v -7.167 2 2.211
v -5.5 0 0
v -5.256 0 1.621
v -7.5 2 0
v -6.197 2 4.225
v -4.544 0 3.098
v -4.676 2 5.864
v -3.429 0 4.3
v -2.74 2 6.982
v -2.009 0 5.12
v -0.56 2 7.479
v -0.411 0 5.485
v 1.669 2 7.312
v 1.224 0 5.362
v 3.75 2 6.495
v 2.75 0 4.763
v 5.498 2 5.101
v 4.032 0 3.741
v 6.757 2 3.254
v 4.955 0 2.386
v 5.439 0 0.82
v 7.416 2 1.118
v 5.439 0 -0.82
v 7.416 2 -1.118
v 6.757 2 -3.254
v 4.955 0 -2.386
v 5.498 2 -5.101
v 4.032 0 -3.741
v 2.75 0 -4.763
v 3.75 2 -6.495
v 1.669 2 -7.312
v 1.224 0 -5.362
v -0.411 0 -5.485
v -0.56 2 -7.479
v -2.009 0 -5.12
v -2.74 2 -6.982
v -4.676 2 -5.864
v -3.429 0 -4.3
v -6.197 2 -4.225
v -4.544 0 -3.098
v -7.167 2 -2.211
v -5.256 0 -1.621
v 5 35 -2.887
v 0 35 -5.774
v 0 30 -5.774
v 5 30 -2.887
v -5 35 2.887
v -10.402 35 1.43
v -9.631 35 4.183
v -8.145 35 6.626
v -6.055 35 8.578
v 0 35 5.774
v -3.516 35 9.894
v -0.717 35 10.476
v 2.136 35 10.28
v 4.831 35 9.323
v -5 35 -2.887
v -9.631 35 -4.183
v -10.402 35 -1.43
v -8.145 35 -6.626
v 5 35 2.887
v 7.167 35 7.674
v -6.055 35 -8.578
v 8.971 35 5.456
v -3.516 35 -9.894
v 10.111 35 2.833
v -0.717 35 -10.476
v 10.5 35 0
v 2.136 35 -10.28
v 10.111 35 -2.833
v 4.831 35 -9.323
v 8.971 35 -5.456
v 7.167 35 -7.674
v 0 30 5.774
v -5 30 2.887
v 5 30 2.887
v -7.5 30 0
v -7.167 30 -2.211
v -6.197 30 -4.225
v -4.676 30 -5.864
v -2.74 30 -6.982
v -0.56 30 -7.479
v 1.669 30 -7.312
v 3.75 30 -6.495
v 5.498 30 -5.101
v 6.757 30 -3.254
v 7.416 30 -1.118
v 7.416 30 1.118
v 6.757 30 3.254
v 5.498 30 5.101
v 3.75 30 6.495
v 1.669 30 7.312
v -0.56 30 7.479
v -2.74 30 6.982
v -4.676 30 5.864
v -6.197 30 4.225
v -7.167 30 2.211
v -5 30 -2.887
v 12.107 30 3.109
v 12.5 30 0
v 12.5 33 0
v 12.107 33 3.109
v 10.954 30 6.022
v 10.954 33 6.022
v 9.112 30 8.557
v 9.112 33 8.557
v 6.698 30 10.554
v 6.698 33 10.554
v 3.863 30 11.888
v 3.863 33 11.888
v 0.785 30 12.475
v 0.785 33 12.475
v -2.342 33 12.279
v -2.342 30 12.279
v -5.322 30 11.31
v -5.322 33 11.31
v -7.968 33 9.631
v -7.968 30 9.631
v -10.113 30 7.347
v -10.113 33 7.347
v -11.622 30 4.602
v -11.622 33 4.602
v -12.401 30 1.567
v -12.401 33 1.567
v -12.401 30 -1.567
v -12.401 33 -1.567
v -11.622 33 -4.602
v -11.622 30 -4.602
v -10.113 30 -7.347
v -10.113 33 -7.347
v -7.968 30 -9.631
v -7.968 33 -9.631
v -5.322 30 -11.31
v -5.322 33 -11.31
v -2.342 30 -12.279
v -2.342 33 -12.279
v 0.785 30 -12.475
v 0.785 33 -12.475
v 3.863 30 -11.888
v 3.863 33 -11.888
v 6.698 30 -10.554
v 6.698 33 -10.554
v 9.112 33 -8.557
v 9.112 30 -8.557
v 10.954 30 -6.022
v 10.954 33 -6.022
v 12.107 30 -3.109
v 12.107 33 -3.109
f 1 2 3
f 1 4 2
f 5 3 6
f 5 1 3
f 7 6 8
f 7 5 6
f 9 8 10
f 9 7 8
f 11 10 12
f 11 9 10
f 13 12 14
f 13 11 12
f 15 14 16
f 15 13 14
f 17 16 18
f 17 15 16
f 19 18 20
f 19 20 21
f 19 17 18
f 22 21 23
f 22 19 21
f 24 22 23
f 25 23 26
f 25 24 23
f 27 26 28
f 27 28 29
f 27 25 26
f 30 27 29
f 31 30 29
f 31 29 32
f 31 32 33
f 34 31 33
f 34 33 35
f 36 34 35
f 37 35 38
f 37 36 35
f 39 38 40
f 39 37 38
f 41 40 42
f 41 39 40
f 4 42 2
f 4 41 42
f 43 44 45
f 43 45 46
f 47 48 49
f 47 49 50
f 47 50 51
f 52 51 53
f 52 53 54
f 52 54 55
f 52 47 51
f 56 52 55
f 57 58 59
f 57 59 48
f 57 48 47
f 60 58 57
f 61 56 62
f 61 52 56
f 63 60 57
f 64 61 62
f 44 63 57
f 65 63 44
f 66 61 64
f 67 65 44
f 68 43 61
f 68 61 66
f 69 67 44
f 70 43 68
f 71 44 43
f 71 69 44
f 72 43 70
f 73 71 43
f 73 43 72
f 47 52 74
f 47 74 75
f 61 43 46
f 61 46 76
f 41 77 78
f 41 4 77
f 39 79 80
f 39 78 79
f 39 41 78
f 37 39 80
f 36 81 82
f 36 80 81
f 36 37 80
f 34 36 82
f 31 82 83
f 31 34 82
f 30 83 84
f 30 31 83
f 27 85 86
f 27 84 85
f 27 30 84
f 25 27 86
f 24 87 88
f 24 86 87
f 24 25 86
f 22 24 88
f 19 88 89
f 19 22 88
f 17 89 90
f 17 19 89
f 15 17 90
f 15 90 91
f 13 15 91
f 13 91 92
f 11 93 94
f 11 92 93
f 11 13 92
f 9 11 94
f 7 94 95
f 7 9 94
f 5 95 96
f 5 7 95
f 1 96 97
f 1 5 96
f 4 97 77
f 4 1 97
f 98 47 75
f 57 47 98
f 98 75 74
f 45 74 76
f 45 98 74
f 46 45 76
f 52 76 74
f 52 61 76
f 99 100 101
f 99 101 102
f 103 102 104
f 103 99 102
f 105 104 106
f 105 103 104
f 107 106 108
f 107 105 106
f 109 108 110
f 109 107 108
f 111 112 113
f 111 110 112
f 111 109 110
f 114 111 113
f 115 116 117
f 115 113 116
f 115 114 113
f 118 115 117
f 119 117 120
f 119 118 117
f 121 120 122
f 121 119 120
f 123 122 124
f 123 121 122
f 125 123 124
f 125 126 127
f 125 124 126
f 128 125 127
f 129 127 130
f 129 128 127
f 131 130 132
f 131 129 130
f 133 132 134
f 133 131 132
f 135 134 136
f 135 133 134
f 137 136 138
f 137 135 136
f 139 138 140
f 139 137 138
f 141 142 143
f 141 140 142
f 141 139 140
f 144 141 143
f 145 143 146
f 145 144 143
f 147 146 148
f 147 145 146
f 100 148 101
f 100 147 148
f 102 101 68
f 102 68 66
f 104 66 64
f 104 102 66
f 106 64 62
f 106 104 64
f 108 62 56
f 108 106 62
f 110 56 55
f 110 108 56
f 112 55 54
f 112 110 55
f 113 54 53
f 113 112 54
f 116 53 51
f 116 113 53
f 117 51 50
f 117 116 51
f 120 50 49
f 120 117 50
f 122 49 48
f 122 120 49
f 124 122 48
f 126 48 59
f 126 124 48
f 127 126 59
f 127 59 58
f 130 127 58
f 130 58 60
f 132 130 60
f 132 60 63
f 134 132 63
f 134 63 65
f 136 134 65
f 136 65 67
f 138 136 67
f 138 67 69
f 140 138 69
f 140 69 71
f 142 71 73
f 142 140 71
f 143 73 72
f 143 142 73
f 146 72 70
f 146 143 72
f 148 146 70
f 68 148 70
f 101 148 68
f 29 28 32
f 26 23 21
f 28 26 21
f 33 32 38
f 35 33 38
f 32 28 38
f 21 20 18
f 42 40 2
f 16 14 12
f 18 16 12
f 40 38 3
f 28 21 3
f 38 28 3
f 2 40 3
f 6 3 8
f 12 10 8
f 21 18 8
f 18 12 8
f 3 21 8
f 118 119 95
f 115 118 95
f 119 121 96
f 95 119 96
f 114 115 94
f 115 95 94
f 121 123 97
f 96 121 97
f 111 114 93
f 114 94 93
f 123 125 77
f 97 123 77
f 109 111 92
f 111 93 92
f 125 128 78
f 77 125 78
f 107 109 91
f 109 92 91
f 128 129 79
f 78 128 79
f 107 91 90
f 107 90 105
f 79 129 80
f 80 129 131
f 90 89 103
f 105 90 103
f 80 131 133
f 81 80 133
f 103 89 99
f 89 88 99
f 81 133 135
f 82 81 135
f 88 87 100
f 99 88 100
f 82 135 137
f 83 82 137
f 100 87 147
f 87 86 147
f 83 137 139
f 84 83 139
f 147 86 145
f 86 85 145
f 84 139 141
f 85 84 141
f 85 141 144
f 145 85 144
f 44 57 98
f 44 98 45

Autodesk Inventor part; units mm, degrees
ref_plane "YZ Plane" through (0, 0, 0) normal (1, 0, 0) x (0, 1, 0)
ref_plane "XZ Plane" through (0, 0, 0) normal (0, 1, 0) x (-1, 0, 0)
ref_plane "XY Plane" through (0, 0, 0) normal (0, 0, 1) x (1, 0, 0)
sketch "Sketch1" plane through (0, 0, 0) normal (0, 1, 0) x (-1, 0, 0)
  circle A0 centre (0, 0) radius 7.5
  dimension "d0" = 15
extrude "Extrusion1" add sketch "Sketch1" along normal blind 30
chamfer "Chamfer1" distance 2 angle 45 1 edges at (7.5, 0, 0)
sketch "Sketch2" plane through (0, 30, 0) normal (0, 1, 0) x (1, 0, 0)
  circle A0 centre (0, 0) radius 12.5
  dimension "d6" = 25
extrude "Extrusion2" add sketch "Sketch2" along normal blind 5
chamfer "Chamfer2" distance 2 angle 45 1 edges at (-12.5, 35, 0)
thread "Thread1" size "M15x1.5" class "6g" standard "ISO Metric profile" length 20
sketch "Sketch3" plane through (0, 35, 0) normal (0, 1, 0) x (1, 0, 0)
  circle A0 centre (0, 0) radius 5.5 projected
  line L0 (0, 5.7735) -> (5, 2.8868)
  line L1 (5, 2.8868) -> (5, -2.8868)
  line L2 (5, -2.8868) -> (0, -5.7735)
  line L3 (0, -5.7735) -> (-5, -2.8868)
  line L4 (-5, -2.8868) -> (-5, 2.8868)
  line L5 (-5, 2.8868) -> (0, 5.7735)
  dimension "d14" = 10
extrude "Extrusion3" cut sketch "Sketch3" against normal blind 5 contours L1 A0 L2 L3 L4 L5 L0 | A0 L0 L1 | L1 L2 A0 | A0 L5 L0 | L2 L3 A0 | A0 L4 L5 | L3 L4 A0
properties part number "Tutorial_001_Bolt" material "Stainless Steel"
